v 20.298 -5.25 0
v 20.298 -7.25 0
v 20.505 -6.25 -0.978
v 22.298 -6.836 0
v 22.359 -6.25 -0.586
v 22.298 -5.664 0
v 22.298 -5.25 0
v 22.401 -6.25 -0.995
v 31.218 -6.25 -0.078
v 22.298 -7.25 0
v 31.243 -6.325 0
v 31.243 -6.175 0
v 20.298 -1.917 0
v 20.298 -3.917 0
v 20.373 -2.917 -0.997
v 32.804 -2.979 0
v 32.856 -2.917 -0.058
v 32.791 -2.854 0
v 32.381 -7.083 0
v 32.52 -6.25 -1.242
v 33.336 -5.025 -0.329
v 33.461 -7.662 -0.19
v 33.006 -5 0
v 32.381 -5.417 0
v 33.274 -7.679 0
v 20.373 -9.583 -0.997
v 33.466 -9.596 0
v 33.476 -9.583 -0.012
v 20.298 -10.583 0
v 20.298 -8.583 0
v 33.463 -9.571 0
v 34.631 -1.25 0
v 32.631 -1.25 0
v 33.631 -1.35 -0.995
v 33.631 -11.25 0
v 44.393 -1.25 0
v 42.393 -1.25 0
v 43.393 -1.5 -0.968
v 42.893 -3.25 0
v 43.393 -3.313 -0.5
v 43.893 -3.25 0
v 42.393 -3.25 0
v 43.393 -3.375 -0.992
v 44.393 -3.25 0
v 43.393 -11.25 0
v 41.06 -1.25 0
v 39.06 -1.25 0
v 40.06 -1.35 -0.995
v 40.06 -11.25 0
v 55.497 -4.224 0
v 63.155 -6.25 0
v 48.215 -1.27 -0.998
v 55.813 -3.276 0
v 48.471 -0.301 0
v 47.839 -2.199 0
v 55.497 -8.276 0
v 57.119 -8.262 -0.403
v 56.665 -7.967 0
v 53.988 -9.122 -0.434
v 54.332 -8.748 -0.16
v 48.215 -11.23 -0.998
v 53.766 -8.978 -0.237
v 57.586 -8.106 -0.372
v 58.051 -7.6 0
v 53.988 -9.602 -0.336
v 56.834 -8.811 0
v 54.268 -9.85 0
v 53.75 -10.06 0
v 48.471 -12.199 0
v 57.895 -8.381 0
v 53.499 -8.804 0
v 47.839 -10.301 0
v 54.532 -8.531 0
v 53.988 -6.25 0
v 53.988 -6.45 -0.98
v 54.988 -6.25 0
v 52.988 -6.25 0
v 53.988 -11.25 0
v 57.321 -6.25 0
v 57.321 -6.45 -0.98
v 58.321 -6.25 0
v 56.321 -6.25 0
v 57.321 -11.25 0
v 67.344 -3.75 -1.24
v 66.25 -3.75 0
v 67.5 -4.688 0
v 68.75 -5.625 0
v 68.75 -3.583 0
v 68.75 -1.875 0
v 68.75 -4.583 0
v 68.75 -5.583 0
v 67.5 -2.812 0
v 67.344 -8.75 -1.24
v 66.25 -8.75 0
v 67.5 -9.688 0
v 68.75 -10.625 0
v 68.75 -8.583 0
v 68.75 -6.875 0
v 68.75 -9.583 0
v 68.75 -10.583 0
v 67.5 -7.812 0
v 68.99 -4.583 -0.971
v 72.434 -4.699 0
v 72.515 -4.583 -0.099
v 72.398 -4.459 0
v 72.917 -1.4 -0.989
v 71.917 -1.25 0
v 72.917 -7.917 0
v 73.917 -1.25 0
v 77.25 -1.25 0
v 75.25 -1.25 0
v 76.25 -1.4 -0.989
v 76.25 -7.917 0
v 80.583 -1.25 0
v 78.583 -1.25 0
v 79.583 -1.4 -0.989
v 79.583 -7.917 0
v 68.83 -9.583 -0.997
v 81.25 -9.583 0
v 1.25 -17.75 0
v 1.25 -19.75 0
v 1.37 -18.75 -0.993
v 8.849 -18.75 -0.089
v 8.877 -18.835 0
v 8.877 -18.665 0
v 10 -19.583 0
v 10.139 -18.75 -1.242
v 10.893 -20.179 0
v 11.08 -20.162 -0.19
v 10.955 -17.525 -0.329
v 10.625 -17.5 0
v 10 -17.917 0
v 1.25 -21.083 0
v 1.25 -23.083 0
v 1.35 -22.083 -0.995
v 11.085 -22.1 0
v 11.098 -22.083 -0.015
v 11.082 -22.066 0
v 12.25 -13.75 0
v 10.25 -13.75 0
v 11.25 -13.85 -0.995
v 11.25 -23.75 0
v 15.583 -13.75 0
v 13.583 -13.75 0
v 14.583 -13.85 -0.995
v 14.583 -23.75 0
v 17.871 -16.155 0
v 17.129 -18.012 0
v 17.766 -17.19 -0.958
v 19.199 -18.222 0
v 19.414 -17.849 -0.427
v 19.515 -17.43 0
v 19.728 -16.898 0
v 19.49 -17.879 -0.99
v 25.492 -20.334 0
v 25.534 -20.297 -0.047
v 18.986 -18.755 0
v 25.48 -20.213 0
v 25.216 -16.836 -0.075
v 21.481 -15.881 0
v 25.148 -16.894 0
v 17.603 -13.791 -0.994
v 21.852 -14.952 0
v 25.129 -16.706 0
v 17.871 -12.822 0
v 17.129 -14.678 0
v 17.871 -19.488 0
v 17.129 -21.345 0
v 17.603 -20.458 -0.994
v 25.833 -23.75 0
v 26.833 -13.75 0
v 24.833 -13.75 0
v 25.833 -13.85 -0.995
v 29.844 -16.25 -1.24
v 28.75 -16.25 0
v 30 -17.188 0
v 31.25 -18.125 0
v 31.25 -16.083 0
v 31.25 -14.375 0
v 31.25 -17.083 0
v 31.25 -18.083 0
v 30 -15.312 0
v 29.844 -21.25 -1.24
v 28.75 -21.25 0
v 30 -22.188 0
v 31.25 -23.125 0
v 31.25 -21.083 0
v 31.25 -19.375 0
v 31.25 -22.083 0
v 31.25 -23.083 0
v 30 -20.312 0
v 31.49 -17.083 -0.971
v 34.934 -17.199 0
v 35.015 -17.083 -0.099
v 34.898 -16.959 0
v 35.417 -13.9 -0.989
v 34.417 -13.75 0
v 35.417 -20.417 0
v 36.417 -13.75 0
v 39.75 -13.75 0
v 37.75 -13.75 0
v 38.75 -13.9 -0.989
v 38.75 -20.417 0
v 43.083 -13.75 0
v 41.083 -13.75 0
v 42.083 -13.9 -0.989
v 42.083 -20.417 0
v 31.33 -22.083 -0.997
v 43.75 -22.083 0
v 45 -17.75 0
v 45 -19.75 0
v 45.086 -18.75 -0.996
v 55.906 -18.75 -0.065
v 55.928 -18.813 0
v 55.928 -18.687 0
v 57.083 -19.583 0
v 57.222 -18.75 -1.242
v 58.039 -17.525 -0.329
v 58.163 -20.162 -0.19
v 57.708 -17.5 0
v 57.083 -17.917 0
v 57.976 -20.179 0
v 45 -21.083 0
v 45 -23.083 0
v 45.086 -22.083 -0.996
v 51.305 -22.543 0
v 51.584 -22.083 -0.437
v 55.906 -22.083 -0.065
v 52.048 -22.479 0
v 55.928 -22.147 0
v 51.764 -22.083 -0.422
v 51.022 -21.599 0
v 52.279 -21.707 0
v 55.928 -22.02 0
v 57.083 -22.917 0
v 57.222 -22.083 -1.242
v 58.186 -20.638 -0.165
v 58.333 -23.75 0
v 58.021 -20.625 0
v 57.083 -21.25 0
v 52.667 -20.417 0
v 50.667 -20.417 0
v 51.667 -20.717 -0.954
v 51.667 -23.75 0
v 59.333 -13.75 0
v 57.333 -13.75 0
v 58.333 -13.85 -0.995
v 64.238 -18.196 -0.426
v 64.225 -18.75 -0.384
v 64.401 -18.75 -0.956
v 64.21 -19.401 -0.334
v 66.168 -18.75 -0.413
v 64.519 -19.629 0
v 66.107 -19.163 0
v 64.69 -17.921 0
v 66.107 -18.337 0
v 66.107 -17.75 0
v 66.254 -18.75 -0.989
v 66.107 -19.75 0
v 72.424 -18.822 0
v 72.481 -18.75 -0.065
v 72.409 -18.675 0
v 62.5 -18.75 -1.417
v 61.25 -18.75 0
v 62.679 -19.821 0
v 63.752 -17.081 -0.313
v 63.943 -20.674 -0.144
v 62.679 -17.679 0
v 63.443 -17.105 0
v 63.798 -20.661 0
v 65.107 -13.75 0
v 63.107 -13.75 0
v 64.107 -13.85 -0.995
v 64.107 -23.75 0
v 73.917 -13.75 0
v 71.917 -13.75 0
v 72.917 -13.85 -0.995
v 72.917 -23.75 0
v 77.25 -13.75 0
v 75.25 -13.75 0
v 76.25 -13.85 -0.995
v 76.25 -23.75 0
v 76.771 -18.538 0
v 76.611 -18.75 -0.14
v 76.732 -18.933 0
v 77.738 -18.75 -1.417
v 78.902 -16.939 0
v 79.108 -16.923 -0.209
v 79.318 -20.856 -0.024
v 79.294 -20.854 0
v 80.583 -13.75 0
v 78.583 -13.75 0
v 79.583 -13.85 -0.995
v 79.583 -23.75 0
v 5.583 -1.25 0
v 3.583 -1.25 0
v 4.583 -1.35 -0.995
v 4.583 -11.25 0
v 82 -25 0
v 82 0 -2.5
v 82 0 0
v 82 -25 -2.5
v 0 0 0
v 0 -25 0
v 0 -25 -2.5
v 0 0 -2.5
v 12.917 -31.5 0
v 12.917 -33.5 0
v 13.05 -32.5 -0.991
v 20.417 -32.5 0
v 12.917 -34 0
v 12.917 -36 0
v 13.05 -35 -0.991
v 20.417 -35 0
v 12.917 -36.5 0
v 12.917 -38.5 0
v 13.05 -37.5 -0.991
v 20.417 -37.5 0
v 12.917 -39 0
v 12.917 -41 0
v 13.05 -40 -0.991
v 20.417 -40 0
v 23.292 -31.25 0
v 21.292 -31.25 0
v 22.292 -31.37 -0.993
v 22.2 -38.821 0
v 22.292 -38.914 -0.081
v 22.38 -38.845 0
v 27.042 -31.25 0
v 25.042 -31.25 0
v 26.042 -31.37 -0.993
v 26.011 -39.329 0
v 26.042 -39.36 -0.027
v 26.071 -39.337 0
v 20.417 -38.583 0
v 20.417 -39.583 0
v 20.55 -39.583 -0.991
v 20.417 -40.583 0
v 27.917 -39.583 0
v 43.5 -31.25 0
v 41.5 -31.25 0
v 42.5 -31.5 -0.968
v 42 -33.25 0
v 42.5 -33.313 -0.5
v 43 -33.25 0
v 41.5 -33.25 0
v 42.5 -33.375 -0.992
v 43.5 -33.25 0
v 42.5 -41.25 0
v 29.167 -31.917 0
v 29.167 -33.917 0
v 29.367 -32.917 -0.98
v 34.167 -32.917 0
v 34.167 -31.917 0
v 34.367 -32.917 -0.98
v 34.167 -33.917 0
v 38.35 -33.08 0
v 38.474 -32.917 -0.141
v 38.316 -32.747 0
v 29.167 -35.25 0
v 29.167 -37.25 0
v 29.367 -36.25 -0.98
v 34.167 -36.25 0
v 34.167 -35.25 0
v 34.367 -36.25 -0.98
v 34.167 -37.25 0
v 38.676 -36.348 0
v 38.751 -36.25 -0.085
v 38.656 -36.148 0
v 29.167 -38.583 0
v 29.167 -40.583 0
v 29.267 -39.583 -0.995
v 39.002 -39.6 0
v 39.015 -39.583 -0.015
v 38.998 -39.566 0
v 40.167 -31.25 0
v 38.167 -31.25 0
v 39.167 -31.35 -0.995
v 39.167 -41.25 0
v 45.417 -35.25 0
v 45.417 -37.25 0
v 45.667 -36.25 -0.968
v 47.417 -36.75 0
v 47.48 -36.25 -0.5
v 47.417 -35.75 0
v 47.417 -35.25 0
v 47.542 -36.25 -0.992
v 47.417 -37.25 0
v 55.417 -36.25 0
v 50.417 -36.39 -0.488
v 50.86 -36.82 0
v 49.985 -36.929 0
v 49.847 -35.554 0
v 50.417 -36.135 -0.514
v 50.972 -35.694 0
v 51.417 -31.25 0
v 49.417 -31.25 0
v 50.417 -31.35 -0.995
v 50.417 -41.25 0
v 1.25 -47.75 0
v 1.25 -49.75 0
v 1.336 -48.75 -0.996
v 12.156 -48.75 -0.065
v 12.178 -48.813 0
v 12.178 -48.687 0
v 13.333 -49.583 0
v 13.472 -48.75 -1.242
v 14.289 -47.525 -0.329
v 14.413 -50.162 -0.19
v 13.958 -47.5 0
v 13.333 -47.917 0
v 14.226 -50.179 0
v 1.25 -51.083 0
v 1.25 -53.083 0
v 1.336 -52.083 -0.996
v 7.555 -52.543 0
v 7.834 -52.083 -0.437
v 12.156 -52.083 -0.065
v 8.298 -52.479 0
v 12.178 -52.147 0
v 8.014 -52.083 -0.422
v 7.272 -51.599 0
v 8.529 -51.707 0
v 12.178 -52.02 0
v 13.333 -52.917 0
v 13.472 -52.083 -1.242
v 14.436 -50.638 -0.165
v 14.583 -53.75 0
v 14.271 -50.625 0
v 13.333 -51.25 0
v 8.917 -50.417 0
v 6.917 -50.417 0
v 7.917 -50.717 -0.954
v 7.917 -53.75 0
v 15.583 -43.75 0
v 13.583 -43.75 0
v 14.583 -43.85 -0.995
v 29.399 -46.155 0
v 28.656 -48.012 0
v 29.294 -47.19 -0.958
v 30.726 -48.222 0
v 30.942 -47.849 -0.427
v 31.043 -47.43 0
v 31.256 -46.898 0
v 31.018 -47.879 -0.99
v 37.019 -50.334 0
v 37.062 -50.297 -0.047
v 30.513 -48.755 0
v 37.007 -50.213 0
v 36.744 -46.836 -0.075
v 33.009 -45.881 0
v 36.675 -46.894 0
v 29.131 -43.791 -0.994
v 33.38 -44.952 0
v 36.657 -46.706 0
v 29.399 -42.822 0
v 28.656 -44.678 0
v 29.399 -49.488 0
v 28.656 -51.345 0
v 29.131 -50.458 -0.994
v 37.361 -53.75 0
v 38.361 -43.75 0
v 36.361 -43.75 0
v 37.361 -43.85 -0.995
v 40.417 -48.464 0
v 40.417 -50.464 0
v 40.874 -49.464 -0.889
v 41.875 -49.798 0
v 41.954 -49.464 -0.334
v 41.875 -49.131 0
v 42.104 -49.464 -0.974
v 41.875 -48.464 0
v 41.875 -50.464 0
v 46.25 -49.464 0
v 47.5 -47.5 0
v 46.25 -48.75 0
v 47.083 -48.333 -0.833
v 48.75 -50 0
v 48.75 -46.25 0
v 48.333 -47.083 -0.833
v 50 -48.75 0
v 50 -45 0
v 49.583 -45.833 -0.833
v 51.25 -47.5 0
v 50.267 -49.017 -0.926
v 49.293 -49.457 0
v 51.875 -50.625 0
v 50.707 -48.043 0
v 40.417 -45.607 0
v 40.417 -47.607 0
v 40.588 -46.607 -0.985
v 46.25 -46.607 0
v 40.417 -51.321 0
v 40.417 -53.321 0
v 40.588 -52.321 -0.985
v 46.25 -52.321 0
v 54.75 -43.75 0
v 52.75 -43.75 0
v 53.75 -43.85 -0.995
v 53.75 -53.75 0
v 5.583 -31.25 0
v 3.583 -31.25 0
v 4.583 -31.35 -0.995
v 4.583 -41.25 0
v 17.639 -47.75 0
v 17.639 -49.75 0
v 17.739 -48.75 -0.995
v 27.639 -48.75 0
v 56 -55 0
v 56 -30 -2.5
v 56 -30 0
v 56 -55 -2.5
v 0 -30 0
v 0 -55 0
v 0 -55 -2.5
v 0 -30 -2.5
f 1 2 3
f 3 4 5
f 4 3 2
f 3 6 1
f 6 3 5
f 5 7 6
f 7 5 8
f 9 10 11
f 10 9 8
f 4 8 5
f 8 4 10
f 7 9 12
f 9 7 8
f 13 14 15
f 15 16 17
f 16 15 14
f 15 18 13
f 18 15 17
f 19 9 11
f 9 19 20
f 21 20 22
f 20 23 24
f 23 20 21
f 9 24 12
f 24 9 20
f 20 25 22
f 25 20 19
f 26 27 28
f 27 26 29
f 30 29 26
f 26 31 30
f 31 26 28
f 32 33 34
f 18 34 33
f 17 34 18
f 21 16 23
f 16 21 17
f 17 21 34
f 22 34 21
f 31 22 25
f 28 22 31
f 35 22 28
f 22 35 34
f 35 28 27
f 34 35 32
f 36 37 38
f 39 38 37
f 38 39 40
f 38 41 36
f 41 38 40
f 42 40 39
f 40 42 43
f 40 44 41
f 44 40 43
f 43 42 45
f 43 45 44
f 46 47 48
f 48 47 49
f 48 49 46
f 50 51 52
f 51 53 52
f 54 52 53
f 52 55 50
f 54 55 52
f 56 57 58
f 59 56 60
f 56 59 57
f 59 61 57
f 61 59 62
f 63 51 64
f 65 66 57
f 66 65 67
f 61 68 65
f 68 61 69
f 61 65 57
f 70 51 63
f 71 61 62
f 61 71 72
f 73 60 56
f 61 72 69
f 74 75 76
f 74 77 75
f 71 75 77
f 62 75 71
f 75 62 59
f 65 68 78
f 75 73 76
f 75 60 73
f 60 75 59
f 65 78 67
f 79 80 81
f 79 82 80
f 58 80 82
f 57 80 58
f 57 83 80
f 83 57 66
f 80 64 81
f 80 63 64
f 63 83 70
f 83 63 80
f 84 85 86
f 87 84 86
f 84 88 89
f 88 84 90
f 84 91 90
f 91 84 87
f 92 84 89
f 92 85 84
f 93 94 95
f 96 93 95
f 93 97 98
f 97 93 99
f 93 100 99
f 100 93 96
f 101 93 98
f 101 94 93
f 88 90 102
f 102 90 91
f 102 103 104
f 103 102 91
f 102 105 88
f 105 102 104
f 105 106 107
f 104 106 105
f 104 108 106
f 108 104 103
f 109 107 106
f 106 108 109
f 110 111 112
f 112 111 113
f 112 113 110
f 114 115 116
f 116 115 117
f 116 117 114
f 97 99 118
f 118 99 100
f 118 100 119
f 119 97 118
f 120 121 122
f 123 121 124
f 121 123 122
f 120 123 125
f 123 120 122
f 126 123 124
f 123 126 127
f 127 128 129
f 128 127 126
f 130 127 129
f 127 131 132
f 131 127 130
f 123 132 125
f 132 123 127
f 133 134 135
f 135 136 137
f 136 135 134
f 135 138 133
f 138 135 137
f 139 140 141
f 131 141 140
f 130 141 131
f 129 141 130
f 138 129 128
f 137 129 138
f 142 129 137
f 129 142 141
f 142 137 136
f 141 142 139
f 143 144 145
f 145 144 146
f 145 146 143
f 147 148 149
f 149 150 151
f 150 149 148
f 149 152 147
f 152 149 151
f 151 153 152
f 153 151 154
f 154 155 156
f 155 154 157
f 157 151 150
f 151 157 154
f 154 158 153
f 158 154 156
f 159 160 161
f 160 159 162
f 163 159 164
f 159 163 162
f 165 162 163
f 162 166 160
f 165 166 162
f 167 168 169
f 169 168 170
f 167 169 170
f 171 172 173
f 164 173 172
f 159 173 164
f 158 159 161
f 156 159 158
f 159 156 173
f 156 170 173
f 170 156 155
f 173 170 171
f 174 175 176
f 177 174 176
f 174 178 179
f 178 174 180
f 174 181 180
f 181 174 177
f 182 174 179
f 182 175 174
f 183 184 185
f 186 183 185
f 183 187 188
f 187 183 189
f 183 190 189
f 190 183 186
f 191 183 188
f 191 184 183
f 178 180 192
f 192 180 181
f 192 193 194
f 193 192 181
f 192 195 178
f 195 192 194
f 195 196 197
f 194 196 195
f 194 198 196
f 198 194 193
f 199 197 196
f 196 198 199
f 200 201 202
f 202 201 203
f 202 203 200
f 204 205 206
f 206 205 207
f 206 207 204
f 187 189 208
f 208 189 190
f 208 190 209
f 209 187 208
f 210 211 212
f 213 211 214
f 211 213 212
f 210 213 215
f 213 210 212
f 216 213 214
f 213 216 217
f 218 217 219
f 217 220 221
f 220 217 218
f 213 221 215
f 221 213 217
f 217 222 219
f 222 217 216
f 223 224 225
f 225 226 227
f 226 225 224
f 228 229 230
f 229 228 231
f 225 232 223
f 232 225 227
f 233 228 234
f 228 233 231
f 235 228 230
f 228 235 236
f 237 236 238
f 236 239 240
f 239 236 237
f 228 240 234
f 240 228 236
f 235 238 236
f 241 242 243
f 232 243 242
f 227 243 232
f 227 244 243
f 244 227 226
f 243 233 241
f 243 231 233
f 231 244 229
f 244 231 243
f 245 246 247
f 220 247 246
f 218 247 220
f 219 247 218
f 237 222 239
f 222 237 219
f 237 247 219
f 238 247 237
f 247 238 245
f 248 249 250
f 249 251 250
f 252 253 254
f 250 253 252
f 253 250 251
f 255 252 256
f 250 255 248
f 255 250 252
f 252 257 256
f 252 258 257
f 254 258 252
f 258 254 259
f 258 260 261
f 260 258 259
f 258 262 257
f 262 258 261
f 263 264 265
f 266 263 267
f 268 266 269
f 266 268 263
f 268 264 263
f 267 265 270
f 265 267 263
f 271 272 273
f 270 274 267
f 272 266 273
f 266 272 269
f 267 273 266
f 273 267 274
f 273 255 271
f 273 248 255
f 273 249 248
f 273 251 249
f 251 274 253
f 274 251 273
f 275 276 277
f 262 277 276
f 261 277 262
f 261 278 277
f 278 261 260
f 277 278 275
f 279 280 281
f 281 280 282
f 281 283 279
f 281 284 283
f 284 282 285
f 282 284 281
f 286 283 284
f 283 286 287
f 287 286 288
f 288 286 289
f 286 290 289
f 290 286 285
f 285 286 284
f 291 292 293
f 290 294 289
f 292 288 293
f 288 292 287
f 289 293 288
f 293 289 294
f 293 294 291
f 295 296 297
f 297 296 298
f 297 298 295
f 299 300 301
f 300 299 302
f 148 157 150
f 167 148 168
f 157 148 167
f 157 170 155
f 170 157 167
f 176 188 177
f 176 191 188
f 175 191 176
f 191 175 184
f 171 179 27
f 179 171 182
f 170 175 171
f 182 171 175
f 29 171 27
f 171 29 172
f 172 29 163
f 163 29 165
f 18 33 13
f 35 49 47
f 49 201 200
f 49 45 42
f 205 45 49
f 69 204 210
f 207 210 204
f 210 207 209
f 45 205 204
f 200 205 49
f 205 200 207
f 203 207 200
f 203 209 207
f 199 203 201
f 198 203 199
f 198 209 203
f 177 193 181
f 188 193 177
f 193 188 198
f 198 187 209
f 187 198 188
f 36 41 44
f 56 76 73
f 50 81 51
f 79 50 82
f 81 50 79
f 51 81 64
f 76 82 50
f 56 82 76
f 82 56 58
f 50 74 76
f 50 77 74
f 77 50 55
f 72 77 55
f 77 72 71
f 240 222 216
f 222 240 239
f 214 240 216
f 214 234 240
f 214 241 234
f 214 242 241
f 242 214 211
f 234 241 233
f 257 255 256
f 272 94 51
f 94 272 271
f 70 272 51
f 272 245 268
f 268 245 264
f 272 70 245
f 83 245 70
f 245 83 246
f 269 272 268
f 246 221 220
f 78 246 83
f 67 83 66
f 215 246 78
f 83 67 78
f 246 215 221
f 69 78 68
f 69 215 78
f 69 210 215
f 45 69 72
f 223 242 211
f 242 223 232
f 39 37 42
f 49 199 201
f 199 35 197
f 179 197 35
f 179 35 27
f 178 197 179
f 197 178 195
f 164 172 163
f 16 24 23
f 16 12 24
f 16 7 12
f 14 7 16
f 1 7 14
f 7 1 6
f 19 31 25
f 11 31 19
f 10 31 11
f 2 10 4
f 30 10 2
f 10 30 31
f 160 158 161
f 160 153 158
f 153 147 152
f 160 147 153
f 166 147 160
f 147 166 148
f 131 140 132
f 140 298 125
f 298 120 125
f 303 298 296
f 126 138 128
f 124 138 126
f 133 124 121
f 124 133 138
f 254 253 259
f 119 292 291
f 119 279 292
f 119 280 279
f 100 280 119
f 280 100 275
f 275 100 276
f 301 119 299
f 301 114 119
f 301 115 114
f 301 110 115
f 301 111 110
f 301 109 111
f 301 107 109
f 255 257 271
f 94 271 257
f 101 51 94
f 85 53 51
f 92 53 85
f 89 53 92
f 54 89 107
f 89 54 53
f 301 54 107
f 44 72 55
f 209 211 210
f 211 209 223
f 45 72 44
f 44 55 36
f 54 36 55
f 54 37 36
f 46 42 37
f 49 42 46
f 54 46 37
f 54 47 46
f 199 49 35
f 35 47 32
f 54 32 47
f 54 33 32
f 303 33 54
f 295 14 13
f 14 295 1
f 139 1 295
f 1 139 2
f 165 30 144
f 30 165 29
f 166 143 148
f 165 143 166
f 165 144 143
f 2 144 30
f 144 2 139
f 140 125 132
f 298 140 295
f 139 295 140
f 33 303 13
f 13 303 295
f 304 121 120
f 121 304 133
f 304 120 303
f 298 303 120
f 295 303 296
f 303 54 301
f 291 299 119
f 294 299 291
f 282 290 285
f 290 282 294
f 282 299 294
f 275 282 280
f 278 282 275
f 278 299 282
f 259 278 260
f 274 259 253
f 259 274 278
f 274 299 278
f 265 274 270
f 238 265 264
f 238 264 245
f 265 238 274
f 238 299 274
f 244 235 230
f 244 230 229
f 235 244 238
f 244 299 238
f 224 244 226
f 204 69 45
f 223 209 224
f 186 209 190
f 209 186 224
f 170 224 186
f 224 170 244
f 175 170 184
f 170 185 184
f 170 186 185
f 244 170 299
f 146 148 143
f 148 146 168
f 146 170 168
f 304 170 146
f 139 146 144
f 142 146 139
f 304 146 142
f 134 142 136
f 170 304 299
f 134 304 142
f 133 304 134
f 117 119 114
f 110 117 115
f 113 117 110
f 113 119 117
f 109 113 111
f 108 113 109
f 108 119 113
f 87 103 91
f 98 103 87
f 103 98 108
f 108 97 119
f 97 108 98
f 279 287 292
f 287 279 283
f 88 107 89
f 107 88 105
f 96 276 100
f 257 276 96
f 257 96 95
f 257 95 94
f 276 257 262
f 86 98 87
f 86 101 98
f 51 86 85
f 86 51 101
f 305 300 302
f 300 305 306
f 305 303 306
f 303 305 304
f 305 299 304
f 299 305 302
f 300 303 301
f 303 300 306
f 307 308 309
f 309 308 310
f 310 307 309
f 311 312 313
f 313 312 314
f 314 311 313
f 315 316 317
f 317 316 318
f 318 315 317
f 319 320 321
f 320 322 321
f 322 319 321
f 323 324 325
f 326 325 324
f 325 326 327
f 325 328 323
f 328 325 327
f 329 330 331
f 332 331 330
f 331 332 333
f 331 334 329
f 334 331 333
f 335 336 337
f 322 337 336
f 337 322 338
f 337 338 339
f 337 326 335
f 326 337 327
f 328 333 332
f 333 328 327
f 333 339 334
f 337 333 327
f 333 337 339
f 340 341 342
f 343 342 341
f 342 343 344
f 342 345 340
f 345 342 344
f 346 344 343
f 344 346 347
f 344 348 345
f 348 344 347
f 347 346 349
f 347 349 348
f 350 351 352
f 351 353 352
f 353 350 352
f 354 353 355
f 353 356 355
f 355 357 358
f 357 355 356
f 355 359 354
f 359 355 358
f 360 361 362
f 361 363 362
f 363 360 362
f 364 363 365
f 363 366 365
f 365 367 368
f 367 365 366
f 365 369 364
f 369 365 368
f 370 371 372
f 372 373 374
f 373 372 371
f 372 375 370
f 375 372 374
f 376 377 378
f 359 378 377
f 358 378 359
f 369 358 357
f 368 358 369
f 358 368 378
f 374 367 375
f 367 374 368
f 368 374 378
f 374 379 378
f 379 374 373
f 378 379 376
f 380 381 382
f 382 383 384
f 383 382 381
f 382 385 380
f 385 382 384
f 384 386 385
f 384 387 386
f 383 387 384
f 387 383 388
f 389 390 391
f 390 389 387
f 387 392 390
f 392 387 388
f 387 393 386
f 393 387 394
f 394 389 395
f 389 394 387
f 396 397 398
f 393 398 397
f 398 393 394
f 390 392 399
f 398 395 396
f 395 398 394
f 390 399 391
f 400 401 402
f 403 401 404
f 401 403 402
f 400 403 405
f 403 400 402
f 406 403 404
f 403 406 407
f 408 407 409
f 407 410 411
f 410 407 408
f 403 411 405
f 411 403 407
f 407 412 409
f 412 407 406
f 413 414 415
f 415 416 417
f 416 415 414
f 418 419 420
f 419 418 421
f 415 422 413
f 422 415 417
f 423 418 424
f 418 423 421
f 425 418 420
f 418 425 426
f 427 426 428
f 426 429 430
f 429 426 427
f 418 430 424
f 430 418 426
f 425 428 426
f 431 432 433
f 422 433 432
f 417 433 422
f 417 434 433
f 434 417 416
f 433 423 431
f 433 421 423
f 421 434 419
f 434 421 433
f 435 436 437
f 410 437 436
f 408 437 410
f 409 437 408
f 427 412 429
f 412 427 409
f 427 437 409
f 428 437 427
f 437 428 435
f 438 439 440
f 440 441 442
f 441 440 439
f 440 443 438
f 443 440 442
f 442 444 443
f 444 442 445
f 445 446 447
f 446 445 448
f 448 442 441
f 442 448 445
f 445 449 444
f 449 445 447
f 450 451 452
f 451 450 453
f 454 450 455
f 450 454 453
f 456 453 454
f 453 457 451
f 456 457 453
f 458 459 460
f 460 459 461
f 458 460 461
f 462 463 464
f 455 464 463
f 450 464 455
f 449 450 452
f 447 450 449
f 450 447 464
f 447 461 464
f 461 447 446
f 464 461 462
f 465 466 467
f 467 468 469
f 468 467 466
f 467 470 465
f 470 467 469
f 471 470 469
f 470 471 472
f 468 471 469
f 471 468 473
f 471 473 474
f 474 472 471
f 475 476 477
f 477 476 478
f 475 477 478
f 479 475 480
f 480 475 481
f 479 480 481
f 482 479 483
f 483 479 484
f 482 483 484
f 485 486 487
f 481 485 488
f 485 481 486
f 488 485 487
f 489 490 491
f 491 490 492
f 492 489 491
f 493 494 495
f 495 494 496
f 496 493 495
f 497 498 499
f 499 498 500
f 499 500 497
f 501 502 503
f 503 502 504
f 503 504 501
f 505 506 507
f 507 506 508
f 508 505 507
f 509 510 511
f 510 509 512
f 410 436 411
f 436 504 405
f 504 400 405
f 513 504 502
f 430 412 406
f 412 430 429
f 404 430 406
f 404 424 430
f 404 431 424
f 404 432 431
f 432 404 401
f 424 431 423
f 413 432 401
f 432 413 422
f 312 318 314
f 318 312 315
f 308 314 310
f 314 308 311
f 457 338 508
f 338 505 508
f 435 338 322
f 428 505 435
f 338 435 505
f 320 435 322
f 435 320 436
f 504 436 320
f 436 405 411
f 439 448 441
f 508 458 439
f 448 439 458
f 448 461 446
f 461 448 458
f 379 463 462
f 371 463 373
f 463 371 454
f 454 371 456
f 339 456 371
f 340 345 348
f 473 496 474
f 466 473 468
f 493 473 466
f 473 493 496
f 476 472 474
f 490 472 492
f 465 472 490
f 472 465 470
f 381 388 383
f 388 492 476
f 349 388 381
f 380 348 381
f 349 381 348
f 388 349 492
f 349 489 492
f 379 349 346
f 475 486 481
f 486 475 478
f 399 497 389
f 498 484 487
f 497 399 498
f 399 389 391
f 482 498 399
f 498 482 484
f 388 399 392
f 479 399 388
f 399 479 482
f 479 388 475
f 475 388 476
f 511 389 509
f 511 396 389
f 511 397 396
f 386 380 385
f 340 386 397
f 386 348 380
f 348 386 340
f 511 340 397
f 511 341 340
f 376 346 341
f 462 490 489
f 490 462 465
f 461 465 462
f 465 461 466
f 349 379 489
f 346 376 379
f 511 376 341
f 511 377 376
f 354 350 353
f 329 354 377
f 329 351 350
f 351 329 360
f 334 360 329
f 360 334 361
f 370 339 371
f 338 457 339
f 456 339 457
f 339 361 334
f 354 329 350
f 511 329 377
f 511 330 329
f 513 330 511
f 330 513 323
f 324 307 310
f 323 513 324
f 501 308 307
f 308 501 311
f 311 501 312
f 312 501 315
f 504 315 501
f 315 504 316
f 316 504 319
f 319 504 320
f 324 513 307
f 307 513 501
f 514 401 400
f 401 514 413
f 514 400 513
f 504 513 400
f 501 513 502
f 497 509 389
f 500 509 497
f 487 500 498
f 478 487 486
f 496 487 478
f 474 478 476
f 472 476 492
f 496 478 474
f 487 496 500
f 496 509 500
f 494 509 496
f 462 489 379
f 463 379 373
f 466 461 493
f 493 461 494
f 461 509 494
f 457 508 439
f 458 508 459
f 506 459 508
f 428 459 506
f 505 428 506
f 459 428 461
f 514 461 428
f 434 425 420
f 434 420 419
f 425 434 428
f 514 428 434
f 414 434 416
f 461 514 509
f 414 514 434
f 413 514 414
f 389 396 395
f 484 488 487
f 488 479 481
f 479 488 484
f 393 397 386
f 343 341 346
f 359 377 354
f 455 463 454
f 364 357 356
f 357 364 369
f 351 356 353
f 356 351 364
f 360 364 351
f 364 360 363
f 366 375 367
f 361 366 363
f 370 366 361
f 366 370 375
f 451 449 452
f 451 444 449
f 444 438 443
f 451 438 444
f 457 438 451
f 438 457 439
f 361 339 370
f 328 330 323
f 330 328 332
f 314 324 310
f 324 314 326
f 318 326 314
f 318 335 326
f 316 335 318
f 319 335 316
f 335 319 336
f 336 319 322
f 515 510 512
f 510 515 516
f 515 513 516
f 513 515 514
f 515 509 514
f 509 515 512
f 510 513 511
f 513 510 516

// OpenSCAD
// file: cuneiform.scad
MAX_STROKE_WIDTH = 1/5;

module wedge(x, y, z, w, h, phi, o=false){
	// o is for offset, an experiment with moving the stroke so that its greatest depth would be at the origin point
	// It's not working very well; just don't use it for now
	// Also need to extend the stroke by delta if we do that
	
	s = w / sqrt(2);
	d = w / 2; // Depth of stroke, from head to deepest point
	l = sqrt(h*h - d*d); // Length of stroke, from deepest point to tip
	theta = atan(d/l); // Angle of stylus
	delta = o ? d*sin(theta) : 0; // Horizontal distance from head of wedge to greatest depth

	translate([x, y, z])
	rotate([0, 0, phi])
	translate([-delta, 0, 0])
	rotate([0, -theta, 0])
	rotate([45, 0, 0])
	translate([0, -s/2, -s/2])
	cube([l, s, s]);
}

module haken(x, y, z, s, d){
	w = s*sqrt(2);
	theta = atan(d/(w/2));
	translate([x, y, z])
	rotate([0, -theta, 0])
	translate([0, 0, -d])
	rotate([0, 0, -45])
	cube([s, s, d]);
}

module singlestroke(x, y, w, h){ // Vertical, positioned from top left corner
	w2 = min(h, w, MAX_STROKE_WIDTH);
	wedge(x+w/2, y, 0, w2, h, 90);
}

module doublestroke(x, y, w, h){
	w2 = min(h, w, MAX_STROKE_WIDTH);
	dist = min(w2, h/4);
	h2 = h - dist;
	h3 = h2 / 2;
	wedge(x+w/2, y, 0, w2, h3, 90);
	wedge(x+w/2, y+dist, 0, w2, h2, 90);
}

module triplestroke(x, y, w, h){
	w2 = min(h, w, MAX_STROKE_WIDTH);
	dist = min(w2, h/4);
	h2 = h - dist*2;
	h3 = min(h2/2, h-dist*2);
	wedge(x+w/2, y, 0, w2, h3, 90);
	wedge(x+w/2, y+dist, 0, w2, h3, 90);
	wedge(x+w/2, y+dist*2, 0, w2, h2, 90);
}

module hookstroke(x, y, w, h, factor=0.75){
//	hh = (w-h/2<0.0001) ? factor*h : h; // By default, the renderer produces hakens that are twice as tall as they are wide - but that means d = 0!
	// We fix this by reducing h by a factor < 1, when this happens
	// Comparing against epsilon instead of zero because transferring numbers from Python to SCAD can do weird things occasionally
	// Experiment: changing w instead of h to make hakens wider, which makes them more visible when they're pressed against verticals
	// Experiment undone - it works better changing h and having an adjustment in the renderer for when it's pressed against a vertical
//	ww = (w-h/2<0.0001) ? w/factor : w;
	ww = w;
	hh = (w-h/2<0.0001) ? h*factor : h;
	s = hh / sqrt(2);
	d = sqrt(ww*ww - hh*hh/4);
	deltaw = (ww-w);
	haken(x-deltaw, y+h/2, 0, s, d); // Use h instead of hh because the haken() module wants the position of the tip, and that needs to be at the midpoint of the *original* bounding box
}

module hrule(y, w, h=0.05){
	s = h*sqrt(2)/2;
	translate([0, y, -s])
		rotate([45, 0, 0])
			cube([w, h, h]);
}

module hatcharea(x, y, w, h){
	// TODO
}
// main file
use <cuneiform.scad>

scale([1,-1,1]){
	difference(){
		translate([0,0,-2.5])
			cube([82,25,2.5]);
		union(){
			translate([1.25,1.25,0]){
				scale([10.0,10.0,10.0]){
					translate([0,0,0]){
						singlestroke(0.16666666666666666, 0, 0.3333333333333333, 1);
					}
					translate([1.9047619047619047,0,0]){
						rotate(-90.0){
							singlestroke(-0.3333333333333333, 0, 0.3333333333333333, 1.3333333333333333);
						}
						rotate(-90.0){
							doublestroke(-0.6666666666666666, 0, 0.3333333333333333, 1.1666666666666665);
						}
						hookstroke(1.0833333333333333, 0.3333333333333333, 0.25, 0.3333333333333333);
						rotate(-90.0){
							singlestroke(-1.0, 0, 0.3333333333333333, 1.3333333333333333);
						}
						singlestroke(1.1666666666666665, 0, 0.3333333333333333, 1);
					}
					translate([3.7142857142857144,0,0]){
						singlestroke(0.0, 0, 0.3333333333333333, 1);
						doublestroke(0.3333333333333333, 0, 0.3333333333333333, 1);
					}
					translate([4.690476190476191,0,0]){
						translate([0,0.0,0]){
							rotate(-71.56505117707799){
								translate([-0.16666666666666666,0,0]){
									singlestroke(0, 0, 0.3333333333333333, 1.5811388300841898);
								}
							}
						}
						translate([0,0.5,0]){
							scale([1,-1,1]){
								translate([0,-0.5,0]){
									translate([0,0,0]){
										rotate(-71.56505117707799){
											translate([-0.16666666666666666,0,0]){
												singlestroke(0, 0, 0.3333333333333333, 1.5811388300841898);
											}
										}
									}
								}
							}
						}
						singlestroke(0.41666666666666674, 0.5, 0.3333333333333333, 0.5);
						singlestroke(0.7500000000000001, 0.5, 0.3333333333333333, 0.5);
					}
					translate([6.5,0,0]){
						hookstroke(0.0, 0.0, 0.25, 0.5);
						hookstroke(0.0, 0.5, 0.25, 0.5);
						rotate(-90.0){
							singlestroke(-0.5, 0.25, 0.3333333333333333, 0.41666666666666674);
						}
						singlestroke(0.5000000000000001, 0, 0.3333333333333333, 0.6666666666666667);
						singlestroke(0.8333333333333335, 0, 0.3333333333333333, 0.6666666666666667);
						singlestroke(1.1666666666666667, 0, 0.3333333333333333, 0.6666666666666667);
						rotate(-90.0){
							singlestroke(-1.0, 0.25, 0.3333333333333333, 1.25);
						}
					}
					translate([0,1.25,0]){
						rotate(-90.0){
							singlestroke(-0.6666666666666666, 0, 0.3333333333333333, 0.8333333333333334);
						}
						hookstroke(0.7500000000000001, 0.3333333333333333, 0.25, 0.3333333333333333);
						rotate(-90.0){
							singlestroke(-1.0, 0, 0.3333333333333333, 1.0);
						}
						singlestroke(0.8333333333333334, 0, 0.3333333333333333, 1);
						singlestroke(1.1666666666666665, 0, 0.3333333333333333, 1);
					}
					translate([1.625,1.25,0]){
						translate([0,0.0,0]){
							rotate(-68.19859051364818){
								translate([-0.16666666666666666,0,0]){
									singlestroke(0, 0, 0.3333333333333333, 0.8975274678557505);
								}
							}
						}
						translate([0,0.3333333333333333,0]){
							rotate(-68.19859051364818){
								translate([-0.16666666666666666,0,0]){
									doublestroke(0, 0, 0.3333333333333333, 0.8975274678557505);
								}
							}
						}
						translate([0,0.6666666666666666,0]){
							rotate(-68.19859051364818){
								translate([-0.16666666666666666,0,0]){
									singlestroke(0, 0, 0.3333333333333333, 0.8975274678557505);
								}
							}
						}
						singlestroke(0.6666666666666666, 0, 0.3333333333333333, 1);
					}
					translate([2.75,1.25,0]){
						hookstroke(0.0, 0.0, 0.25, 0.5);
						hookstroke(0.0, 0.5, 0.25, 0.5);
						rotate(-90.0){
							singlestroke(-0.5, 0.25, 0.3333333333333333, 0.41666666666666674);
						}
						singlestroke(0.5000000000000001, 0, 0.3333333333333333, 0.6666666666666667);
						singlestroke(0.8333333333333335, 0, 0.3333333333333333, 0.6666666666666667);
						singlestroke(1.1666666666666667, 0, 0.3333333333333333, 0.6666666666666667);
						rotate(-90.0){
							singlestroke(-1.0, 0.25, 0.3333333333333333, 1.25);
						}
					}
					translate([4.375,1.25,0]){
						rotate(-90.0){
							singlestroke(-0.6666666666666666, 0, 0.3333333333333333, 1.1666666666666665);
						}
						hookstroke(1.0833333333333333, 0.3333333333333333, 0.25, 0.3333333333333333);
						rotate(-90.0){
							singlestroke(-1.0, 0, 0.3333333333333333, 1.1666666666666665);
						}
						hookstroke(1.0833333333333333, 0.6666666666666666, 0.25, 0.3333333333333333);
						singlestroke(0.5, 0.6666666666666666, 0.3333333333333333, 0.3333333333333333);
						singlestroke(1.1666666666666665, 0, 0.3333333333333333, 1);
					}
					translate([6.0,1.25,0]){
						hookstroke(0, 0.2142857142857143, 0.2857142857142857, 0.5714285714285714);
						singlestroke(0.11904761904761904, 0, 0.3333333333333333, 1);
						rotate(-90.0){
							doublestroke(-0.6666666666666667, 0.2857142857142857, 0.3333333333333333, 0.880952380952381);
						}
						singlestroke(1.0, 0, 0.3333333333333333, 1);
						singlestroke(1.3333333333333333, 0, 0.3333333333333333, 1);
						hookstroke(1.5238095238095237, 0.2142857142857143, 0.2857142857142857, 0.5714285714285714);
						singlestroke(1.6666666666666665, 0, 0.3333333333333333, 1);
					}
				}
			}
		}
	}
}

translate([0, -30, 0])
scale([1,-1,1]){
	difference(){
		translate([0,0,-2.5])
			cube([56,25,2.5]);
		union(){
			translate([1.25,1.25,0]){
				scale([10.0,10.0,10.0]){
					translate([0,0,0]){
						singlestroke(0.16666666666666666, 0, 0.3333333333333333, 1);
					}
					translate([1.1666666666666665,0,0]){
						rotate(-90.0){
							singlestroke(-0.25, 0.0, 0.25, 0.75);
						}
						rotate(-90.0){
							singlestroke(-0.5, 0.0, 0.25, 0.75);
						}
						rotate(-90.0){
							singlestroke(-0.75, 0.0, 0.25, 0.75);
						}
						rotate(-90.0){
							singlestroke(-1.0, 0.0, 0.25, 0.75);
						}
						singlestroke(0.7708333333333334, 0, 0.3333333333333333, 0.8333333333333333);
						singlestroke(1.1458333333333333, 0, 0.3333333333333333, 0.8333333333333333);
						rotate(-90.0){
							singlestroke(-1.0, 0.75, 0.3333333333333333, 0.75);
						}
					}
					translate([2.7916666666666665,0,0]){
						rotate(-90.0){
							singlestroke(-0.3333333333333333, 0.0, 0.3333333333333333, 0.5);
						}
						rotate(-90.0){
							singlestroke(-0.3333333333333333, 0.5, 0.3333333333333333, 0.5);
						}
						rotate(-90.0){
							singlestroke(-0.6666666666666666, 0.0, 0.3333333333333333, 0.5);
						}
						rotate(-90.0){
							singlestroke(-0.6666666666666666, 0.5, 0.3333333333333333, 0.5);
						}
						rotate(-90.0){
							singlestroke(-1.0, 0, 0.3333333333333333, 1.0);
						}
						singlestroke(0.8333333333333334, 0, 0.3333333333333333, 1);
						doublestroke(1.1666666666666665, 0, 0.3333333333333333, 1);
					}
					translate([4.416666666666666,0,0]){
						rotate(-90.0){
							doublestroke(-0.6666666666666667, 0, 0.3333333333333333, 1);
						}
						singlestroke(0.33333333333333337, 0, 0.3333333333333333, 1);
					}
					translate([0,1.25,0]){
						rotate(-90.0){
							singlestroke(-0.6666666666666666, 0, 0.3333333333333333, 1.1666666666666665);
						}
						hookstroke(1.0833333333333333, 0.3333333333333333, 0.25, 0.3333333333333333);
						rotate(-90.0){
							singlestroke(-1.0, 0, 0.3333333333333333, 1.1666666666666665);
						}
						hookstroke(1.0833333333333333, 0.6666666666666666, 0.25, 0.3333333333333333);
						singlestroke(0.5, 0.6666666666666666, 0.3333333333333333, 0.3333333333333333);
						singlestroke(1.1666666666666665, 0, 0.3333333333333333, 1);
					}
					translate([1.6388888888888886,1.25,0]){
						rotate(-90.0){
							singlestroke(-0.6666666666666667, 0, 0.3333333333333333, 1);
						}
					}
					translate([2.7777777777777772,1.25,0]){
						translate([0,0.0,0]){
							rotate(-68.19859051364818){
								translate([-0.16666666666666666,0,0]){
									singlestroke(0, 0, 0.3333333333333333, 0.8975274678557505);
								}
							}
						}
						translate([0,0.3333333333333333,0]){
							rotate(-68.19859051364818){
								translate([-0.16666666666666666,0,0]){
									doublestroke(0, 0, 0.3333333333333333, 0.8975274678557505);
								}
							}
						}
						translate([0,0.6666666666666666,0]){
							rotate(-68.19859051364818){
								translate([-0.16666666666666666,0,0]){
									singlestroke(0, 0, 0.3333333333333333, 0.8975274678557505);
								}
							}
						}
						singlestroke(0.6666666666666666, 0, 0.3333333333333333, 1);
					}
					translate([3.916666666666666,1.25,0]){
						rotate(-90.0){
							singlestroke(-0.4285888671875, 0, 0.28570556640625, 0.5833333333333333);
						}
						rotate(-90.0){
							doublestroke(-0.71429443359375, 0, 0.28570556640625, 0.5833333333333333);
						}
						rotate(-90.0){
							singlestroke(-1.0, 0, 0.28570556640625, 0.5833333333333333);
						}
						translate([0.5833333333333333,0.5,0]){
							rotate(-45.0){
								singlestroke(0.0, 0.0, 0.1767766952966369, 0.26516504294495535);
								singlestroke(0.1767766952966369, 0.0, 0.1767766952966369, 0.26516504294495535);
								singlestroke(0.3535533905932738, 0.0, 0.1767766952966369, 0.26516504294495535);
								singlestroke(0.0984983762782887, 0.26516504294495535, 0.3333333333333333, 0.26516504294495535);
							}
						}
						singlestroke(1.1666666666666665, 0, 0.3333333333333333, 1);
					}
				}
			}
		}
	}
}
